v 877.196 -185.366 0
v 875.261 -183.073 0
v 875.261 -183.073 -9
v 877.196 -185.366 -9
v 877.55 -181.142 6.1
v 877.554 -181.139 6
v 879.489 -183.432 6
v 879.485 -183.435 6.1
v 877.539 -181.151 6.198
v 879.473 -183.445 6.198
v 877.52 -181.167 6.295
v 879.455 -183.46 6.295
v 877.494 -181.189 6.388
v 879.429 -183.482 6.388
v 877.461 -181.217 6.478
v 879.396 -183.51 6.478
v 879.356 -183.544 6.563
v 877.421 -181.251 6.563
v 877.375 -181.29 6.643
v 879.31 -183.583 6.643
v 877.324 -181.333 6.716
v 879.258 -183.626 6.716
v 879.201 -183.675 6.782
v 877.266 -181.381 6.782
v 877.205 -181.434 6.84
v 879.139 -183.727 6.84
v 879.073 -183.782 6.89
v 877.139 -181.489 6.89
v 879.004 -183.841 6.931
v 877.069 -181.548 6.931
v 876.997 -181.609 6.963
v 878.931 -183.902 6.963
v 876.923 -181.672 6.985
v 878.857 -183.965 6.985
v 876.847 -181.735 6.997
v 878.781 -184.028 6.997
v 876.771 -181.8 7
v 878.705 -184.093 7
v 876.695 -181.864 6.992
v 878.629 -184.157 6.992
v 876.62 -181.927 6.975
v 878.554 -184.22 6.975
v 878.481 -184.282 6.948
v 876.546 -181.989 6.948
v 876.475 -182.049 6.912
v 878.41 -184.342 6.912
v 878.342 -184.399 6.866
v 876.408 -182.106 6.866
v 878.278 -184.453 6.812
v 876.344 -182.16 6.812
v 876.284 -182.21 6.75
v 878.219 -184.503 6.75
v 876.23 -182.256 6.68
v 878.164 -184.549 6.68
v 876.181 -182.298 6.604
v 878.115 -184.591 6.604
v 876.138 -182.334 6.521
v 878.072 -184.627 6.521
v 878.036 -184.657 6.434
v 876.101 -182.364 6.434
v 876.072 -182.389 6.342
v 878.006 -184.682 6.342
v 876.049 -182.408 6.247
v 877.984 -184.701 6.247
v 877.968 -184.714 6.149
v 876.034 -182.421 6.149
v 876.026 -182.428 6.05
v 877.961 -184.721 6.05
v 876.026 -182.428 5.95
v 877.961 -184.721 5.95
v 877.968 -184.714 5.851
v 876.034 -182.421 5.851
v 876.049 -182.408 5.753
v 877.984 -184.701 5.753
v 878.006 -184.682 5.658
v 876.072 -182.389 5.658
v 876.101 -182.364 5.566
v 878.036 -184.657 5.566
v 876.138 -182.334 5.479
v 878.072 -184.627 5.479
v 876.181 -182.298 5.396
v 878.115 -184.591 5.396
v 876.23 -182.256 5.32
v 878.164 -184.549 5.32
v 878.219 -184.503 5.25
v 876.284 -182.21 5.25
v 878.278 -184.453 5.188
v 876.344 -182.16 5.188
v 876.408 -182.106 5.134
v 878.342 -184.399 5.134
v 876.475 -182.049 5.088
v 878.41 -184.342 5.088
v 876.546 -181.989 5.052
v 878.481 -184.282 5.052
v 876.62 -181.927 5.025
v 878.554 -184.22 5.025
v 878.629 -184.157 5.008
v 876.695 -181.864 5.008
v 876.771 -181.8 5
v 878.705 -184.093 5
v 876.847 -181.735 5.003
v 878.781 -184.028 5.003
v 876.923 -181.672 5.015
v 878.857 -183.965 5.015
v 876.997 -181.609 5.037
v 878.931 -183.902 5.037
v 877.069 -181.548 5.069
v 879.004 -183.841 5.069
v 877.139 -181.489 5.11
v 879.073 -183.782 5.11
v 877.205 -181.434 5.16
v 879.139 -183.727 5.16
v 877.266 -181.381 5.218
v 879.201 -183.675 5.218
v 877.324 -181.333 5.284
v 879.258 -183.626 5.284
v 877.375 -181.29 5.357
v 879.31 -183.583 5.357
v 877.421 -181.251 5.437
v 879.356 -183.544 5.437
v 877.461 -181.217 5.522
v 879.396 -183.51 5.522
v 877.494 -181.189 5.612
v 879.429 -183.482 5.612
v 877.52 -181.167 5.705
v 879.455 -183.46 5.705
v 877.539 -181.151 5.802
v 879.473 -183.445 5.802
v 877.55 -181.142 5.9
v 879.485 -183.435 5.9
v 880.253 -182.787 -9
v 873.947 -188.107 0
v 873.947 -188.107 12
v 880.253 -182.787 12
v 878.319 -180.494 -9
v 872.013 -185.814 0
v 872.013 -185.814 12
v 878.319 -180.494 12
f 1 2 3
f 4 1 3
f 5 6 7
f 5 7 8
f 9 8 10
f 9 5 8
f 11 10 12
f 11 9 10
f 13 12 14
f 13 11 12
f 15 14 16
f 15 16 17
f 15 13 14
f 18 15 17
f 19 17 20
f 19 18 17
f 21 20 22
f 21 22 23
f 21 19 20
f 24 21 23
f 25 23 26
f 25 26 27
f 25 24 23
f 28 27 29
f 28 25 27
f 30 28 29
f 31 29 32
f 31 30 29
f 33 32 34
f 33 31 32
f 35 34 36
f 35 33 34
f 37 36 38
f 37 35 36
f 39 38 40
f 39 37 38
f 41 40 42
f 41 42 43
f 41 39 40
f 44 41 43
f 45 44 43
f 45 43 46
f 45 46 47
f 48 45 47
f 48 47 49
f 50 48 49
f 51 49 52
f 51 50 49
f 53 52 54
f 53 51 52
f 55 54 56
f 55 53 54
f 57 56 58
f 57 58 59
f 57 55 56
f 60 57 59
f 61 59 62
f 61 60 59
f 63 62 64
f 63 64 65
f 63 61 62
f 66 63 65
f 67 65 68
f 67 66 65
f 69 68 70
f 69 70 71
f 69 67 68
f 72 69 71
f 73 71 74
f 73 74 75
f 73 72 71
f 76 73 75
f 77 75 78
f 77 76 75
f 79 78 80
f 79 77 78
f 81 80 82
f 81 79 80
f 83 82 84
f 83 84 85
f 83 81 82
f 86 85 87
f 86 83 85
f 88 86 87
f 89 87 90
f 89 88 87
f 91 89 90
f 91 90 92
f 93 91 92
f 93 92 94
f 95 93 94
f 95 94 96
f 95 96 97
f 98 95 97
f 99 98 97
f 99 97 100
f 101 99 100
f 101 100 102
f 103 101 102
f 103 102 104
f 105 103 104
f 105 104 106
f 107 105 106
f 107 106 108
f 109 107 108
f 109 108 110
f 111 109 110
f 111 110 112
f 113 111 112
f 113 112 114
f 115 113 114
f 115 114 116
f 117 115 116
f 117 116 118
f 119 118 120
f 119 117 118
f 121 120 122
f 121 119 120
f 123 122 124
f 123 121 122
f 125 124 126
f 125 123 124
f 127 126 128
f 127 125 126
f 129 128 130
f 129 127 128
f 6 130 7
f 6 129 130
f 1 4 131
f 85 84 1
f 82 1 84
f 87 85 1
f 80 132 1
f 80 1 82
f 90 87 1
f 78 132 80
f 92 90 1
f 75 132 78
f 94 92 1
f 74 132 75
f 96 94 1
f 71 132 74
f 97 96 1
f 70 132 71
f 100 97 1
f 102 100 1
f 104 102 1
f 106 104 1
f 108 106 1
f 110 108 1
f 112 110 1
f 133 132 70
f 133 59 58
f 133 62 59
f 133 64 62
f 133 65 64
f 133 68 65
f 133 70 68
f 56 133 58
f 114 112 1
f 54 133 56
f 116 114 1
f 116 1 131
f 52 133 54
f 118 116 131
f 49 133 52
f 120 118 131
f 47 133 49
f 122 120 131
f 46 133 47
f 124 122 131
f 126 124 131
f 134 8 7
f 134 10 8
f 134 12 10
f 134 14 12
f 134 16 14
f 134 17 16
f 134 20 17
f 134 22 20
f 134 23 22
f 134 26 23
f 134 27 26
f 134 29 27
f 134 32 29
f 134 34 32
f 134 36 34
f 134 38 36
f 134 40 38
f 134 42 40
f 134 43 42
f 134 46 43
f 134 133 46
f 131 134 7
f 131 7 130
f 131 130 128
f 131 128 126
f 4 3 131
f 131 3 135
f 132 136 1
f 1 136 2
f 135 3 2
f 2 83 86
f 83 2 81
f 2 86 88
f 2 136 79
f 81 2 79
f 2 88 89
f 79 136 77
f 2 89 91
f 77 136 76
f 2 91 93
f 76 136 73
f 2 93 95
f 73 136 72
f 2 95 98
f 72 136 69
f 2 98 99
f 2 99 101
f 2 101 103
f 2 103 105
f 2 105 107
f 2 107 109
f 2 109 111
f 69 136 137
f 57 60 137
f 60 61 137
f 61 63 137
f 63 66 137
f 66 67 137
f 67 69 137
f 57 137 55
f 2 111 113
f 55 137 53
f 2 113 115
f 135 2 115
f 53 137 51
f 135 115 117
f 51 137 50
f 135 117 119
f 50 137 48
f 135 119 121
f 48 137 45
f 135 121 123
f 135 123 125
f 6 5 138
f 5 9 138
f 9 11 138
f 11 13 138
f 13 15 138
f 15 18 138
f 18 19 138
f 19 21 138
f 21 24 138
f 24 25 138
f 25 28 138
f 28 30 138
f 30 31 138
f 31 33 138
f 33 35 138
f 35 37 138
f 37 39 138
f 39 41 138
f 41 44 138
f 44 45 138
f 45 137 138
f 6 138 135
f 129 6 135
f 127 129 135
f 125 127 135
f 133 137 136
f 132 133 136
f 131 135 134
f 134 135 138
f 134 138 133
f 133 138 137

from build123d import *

# Parameters (mm, degrees)
SKETCH4_R           = 1
BOSS_EXTRUDE1_DEPTH = 3


with BuildPart() as part:
    # Sketch4 → Boss-Extrude1 (new body)
    with BuildSketch(Plane(origin=(454.145082272, -538.33265317, 0), x_dir=(0.7643426316132825, 0.6448103143549132, 0), z_dir=(0.6448103143549132, -0.7643426316132826, 0))):
        Polygon((554.951991089, 0), (554.951991089, 12), (546.701991089, 12), (546.701991089, 0), (550.951991089, 0), (550.951991089, -9), (554.951991089, -9), align=None)
        with Locations((552.951991089, 6)):
            Circle(SKETCH4_R, mode=Mode.SUBTRACT)
    extrude(amount=BOSS_EXTRUDE1_DEPTH)


solid = part.part
